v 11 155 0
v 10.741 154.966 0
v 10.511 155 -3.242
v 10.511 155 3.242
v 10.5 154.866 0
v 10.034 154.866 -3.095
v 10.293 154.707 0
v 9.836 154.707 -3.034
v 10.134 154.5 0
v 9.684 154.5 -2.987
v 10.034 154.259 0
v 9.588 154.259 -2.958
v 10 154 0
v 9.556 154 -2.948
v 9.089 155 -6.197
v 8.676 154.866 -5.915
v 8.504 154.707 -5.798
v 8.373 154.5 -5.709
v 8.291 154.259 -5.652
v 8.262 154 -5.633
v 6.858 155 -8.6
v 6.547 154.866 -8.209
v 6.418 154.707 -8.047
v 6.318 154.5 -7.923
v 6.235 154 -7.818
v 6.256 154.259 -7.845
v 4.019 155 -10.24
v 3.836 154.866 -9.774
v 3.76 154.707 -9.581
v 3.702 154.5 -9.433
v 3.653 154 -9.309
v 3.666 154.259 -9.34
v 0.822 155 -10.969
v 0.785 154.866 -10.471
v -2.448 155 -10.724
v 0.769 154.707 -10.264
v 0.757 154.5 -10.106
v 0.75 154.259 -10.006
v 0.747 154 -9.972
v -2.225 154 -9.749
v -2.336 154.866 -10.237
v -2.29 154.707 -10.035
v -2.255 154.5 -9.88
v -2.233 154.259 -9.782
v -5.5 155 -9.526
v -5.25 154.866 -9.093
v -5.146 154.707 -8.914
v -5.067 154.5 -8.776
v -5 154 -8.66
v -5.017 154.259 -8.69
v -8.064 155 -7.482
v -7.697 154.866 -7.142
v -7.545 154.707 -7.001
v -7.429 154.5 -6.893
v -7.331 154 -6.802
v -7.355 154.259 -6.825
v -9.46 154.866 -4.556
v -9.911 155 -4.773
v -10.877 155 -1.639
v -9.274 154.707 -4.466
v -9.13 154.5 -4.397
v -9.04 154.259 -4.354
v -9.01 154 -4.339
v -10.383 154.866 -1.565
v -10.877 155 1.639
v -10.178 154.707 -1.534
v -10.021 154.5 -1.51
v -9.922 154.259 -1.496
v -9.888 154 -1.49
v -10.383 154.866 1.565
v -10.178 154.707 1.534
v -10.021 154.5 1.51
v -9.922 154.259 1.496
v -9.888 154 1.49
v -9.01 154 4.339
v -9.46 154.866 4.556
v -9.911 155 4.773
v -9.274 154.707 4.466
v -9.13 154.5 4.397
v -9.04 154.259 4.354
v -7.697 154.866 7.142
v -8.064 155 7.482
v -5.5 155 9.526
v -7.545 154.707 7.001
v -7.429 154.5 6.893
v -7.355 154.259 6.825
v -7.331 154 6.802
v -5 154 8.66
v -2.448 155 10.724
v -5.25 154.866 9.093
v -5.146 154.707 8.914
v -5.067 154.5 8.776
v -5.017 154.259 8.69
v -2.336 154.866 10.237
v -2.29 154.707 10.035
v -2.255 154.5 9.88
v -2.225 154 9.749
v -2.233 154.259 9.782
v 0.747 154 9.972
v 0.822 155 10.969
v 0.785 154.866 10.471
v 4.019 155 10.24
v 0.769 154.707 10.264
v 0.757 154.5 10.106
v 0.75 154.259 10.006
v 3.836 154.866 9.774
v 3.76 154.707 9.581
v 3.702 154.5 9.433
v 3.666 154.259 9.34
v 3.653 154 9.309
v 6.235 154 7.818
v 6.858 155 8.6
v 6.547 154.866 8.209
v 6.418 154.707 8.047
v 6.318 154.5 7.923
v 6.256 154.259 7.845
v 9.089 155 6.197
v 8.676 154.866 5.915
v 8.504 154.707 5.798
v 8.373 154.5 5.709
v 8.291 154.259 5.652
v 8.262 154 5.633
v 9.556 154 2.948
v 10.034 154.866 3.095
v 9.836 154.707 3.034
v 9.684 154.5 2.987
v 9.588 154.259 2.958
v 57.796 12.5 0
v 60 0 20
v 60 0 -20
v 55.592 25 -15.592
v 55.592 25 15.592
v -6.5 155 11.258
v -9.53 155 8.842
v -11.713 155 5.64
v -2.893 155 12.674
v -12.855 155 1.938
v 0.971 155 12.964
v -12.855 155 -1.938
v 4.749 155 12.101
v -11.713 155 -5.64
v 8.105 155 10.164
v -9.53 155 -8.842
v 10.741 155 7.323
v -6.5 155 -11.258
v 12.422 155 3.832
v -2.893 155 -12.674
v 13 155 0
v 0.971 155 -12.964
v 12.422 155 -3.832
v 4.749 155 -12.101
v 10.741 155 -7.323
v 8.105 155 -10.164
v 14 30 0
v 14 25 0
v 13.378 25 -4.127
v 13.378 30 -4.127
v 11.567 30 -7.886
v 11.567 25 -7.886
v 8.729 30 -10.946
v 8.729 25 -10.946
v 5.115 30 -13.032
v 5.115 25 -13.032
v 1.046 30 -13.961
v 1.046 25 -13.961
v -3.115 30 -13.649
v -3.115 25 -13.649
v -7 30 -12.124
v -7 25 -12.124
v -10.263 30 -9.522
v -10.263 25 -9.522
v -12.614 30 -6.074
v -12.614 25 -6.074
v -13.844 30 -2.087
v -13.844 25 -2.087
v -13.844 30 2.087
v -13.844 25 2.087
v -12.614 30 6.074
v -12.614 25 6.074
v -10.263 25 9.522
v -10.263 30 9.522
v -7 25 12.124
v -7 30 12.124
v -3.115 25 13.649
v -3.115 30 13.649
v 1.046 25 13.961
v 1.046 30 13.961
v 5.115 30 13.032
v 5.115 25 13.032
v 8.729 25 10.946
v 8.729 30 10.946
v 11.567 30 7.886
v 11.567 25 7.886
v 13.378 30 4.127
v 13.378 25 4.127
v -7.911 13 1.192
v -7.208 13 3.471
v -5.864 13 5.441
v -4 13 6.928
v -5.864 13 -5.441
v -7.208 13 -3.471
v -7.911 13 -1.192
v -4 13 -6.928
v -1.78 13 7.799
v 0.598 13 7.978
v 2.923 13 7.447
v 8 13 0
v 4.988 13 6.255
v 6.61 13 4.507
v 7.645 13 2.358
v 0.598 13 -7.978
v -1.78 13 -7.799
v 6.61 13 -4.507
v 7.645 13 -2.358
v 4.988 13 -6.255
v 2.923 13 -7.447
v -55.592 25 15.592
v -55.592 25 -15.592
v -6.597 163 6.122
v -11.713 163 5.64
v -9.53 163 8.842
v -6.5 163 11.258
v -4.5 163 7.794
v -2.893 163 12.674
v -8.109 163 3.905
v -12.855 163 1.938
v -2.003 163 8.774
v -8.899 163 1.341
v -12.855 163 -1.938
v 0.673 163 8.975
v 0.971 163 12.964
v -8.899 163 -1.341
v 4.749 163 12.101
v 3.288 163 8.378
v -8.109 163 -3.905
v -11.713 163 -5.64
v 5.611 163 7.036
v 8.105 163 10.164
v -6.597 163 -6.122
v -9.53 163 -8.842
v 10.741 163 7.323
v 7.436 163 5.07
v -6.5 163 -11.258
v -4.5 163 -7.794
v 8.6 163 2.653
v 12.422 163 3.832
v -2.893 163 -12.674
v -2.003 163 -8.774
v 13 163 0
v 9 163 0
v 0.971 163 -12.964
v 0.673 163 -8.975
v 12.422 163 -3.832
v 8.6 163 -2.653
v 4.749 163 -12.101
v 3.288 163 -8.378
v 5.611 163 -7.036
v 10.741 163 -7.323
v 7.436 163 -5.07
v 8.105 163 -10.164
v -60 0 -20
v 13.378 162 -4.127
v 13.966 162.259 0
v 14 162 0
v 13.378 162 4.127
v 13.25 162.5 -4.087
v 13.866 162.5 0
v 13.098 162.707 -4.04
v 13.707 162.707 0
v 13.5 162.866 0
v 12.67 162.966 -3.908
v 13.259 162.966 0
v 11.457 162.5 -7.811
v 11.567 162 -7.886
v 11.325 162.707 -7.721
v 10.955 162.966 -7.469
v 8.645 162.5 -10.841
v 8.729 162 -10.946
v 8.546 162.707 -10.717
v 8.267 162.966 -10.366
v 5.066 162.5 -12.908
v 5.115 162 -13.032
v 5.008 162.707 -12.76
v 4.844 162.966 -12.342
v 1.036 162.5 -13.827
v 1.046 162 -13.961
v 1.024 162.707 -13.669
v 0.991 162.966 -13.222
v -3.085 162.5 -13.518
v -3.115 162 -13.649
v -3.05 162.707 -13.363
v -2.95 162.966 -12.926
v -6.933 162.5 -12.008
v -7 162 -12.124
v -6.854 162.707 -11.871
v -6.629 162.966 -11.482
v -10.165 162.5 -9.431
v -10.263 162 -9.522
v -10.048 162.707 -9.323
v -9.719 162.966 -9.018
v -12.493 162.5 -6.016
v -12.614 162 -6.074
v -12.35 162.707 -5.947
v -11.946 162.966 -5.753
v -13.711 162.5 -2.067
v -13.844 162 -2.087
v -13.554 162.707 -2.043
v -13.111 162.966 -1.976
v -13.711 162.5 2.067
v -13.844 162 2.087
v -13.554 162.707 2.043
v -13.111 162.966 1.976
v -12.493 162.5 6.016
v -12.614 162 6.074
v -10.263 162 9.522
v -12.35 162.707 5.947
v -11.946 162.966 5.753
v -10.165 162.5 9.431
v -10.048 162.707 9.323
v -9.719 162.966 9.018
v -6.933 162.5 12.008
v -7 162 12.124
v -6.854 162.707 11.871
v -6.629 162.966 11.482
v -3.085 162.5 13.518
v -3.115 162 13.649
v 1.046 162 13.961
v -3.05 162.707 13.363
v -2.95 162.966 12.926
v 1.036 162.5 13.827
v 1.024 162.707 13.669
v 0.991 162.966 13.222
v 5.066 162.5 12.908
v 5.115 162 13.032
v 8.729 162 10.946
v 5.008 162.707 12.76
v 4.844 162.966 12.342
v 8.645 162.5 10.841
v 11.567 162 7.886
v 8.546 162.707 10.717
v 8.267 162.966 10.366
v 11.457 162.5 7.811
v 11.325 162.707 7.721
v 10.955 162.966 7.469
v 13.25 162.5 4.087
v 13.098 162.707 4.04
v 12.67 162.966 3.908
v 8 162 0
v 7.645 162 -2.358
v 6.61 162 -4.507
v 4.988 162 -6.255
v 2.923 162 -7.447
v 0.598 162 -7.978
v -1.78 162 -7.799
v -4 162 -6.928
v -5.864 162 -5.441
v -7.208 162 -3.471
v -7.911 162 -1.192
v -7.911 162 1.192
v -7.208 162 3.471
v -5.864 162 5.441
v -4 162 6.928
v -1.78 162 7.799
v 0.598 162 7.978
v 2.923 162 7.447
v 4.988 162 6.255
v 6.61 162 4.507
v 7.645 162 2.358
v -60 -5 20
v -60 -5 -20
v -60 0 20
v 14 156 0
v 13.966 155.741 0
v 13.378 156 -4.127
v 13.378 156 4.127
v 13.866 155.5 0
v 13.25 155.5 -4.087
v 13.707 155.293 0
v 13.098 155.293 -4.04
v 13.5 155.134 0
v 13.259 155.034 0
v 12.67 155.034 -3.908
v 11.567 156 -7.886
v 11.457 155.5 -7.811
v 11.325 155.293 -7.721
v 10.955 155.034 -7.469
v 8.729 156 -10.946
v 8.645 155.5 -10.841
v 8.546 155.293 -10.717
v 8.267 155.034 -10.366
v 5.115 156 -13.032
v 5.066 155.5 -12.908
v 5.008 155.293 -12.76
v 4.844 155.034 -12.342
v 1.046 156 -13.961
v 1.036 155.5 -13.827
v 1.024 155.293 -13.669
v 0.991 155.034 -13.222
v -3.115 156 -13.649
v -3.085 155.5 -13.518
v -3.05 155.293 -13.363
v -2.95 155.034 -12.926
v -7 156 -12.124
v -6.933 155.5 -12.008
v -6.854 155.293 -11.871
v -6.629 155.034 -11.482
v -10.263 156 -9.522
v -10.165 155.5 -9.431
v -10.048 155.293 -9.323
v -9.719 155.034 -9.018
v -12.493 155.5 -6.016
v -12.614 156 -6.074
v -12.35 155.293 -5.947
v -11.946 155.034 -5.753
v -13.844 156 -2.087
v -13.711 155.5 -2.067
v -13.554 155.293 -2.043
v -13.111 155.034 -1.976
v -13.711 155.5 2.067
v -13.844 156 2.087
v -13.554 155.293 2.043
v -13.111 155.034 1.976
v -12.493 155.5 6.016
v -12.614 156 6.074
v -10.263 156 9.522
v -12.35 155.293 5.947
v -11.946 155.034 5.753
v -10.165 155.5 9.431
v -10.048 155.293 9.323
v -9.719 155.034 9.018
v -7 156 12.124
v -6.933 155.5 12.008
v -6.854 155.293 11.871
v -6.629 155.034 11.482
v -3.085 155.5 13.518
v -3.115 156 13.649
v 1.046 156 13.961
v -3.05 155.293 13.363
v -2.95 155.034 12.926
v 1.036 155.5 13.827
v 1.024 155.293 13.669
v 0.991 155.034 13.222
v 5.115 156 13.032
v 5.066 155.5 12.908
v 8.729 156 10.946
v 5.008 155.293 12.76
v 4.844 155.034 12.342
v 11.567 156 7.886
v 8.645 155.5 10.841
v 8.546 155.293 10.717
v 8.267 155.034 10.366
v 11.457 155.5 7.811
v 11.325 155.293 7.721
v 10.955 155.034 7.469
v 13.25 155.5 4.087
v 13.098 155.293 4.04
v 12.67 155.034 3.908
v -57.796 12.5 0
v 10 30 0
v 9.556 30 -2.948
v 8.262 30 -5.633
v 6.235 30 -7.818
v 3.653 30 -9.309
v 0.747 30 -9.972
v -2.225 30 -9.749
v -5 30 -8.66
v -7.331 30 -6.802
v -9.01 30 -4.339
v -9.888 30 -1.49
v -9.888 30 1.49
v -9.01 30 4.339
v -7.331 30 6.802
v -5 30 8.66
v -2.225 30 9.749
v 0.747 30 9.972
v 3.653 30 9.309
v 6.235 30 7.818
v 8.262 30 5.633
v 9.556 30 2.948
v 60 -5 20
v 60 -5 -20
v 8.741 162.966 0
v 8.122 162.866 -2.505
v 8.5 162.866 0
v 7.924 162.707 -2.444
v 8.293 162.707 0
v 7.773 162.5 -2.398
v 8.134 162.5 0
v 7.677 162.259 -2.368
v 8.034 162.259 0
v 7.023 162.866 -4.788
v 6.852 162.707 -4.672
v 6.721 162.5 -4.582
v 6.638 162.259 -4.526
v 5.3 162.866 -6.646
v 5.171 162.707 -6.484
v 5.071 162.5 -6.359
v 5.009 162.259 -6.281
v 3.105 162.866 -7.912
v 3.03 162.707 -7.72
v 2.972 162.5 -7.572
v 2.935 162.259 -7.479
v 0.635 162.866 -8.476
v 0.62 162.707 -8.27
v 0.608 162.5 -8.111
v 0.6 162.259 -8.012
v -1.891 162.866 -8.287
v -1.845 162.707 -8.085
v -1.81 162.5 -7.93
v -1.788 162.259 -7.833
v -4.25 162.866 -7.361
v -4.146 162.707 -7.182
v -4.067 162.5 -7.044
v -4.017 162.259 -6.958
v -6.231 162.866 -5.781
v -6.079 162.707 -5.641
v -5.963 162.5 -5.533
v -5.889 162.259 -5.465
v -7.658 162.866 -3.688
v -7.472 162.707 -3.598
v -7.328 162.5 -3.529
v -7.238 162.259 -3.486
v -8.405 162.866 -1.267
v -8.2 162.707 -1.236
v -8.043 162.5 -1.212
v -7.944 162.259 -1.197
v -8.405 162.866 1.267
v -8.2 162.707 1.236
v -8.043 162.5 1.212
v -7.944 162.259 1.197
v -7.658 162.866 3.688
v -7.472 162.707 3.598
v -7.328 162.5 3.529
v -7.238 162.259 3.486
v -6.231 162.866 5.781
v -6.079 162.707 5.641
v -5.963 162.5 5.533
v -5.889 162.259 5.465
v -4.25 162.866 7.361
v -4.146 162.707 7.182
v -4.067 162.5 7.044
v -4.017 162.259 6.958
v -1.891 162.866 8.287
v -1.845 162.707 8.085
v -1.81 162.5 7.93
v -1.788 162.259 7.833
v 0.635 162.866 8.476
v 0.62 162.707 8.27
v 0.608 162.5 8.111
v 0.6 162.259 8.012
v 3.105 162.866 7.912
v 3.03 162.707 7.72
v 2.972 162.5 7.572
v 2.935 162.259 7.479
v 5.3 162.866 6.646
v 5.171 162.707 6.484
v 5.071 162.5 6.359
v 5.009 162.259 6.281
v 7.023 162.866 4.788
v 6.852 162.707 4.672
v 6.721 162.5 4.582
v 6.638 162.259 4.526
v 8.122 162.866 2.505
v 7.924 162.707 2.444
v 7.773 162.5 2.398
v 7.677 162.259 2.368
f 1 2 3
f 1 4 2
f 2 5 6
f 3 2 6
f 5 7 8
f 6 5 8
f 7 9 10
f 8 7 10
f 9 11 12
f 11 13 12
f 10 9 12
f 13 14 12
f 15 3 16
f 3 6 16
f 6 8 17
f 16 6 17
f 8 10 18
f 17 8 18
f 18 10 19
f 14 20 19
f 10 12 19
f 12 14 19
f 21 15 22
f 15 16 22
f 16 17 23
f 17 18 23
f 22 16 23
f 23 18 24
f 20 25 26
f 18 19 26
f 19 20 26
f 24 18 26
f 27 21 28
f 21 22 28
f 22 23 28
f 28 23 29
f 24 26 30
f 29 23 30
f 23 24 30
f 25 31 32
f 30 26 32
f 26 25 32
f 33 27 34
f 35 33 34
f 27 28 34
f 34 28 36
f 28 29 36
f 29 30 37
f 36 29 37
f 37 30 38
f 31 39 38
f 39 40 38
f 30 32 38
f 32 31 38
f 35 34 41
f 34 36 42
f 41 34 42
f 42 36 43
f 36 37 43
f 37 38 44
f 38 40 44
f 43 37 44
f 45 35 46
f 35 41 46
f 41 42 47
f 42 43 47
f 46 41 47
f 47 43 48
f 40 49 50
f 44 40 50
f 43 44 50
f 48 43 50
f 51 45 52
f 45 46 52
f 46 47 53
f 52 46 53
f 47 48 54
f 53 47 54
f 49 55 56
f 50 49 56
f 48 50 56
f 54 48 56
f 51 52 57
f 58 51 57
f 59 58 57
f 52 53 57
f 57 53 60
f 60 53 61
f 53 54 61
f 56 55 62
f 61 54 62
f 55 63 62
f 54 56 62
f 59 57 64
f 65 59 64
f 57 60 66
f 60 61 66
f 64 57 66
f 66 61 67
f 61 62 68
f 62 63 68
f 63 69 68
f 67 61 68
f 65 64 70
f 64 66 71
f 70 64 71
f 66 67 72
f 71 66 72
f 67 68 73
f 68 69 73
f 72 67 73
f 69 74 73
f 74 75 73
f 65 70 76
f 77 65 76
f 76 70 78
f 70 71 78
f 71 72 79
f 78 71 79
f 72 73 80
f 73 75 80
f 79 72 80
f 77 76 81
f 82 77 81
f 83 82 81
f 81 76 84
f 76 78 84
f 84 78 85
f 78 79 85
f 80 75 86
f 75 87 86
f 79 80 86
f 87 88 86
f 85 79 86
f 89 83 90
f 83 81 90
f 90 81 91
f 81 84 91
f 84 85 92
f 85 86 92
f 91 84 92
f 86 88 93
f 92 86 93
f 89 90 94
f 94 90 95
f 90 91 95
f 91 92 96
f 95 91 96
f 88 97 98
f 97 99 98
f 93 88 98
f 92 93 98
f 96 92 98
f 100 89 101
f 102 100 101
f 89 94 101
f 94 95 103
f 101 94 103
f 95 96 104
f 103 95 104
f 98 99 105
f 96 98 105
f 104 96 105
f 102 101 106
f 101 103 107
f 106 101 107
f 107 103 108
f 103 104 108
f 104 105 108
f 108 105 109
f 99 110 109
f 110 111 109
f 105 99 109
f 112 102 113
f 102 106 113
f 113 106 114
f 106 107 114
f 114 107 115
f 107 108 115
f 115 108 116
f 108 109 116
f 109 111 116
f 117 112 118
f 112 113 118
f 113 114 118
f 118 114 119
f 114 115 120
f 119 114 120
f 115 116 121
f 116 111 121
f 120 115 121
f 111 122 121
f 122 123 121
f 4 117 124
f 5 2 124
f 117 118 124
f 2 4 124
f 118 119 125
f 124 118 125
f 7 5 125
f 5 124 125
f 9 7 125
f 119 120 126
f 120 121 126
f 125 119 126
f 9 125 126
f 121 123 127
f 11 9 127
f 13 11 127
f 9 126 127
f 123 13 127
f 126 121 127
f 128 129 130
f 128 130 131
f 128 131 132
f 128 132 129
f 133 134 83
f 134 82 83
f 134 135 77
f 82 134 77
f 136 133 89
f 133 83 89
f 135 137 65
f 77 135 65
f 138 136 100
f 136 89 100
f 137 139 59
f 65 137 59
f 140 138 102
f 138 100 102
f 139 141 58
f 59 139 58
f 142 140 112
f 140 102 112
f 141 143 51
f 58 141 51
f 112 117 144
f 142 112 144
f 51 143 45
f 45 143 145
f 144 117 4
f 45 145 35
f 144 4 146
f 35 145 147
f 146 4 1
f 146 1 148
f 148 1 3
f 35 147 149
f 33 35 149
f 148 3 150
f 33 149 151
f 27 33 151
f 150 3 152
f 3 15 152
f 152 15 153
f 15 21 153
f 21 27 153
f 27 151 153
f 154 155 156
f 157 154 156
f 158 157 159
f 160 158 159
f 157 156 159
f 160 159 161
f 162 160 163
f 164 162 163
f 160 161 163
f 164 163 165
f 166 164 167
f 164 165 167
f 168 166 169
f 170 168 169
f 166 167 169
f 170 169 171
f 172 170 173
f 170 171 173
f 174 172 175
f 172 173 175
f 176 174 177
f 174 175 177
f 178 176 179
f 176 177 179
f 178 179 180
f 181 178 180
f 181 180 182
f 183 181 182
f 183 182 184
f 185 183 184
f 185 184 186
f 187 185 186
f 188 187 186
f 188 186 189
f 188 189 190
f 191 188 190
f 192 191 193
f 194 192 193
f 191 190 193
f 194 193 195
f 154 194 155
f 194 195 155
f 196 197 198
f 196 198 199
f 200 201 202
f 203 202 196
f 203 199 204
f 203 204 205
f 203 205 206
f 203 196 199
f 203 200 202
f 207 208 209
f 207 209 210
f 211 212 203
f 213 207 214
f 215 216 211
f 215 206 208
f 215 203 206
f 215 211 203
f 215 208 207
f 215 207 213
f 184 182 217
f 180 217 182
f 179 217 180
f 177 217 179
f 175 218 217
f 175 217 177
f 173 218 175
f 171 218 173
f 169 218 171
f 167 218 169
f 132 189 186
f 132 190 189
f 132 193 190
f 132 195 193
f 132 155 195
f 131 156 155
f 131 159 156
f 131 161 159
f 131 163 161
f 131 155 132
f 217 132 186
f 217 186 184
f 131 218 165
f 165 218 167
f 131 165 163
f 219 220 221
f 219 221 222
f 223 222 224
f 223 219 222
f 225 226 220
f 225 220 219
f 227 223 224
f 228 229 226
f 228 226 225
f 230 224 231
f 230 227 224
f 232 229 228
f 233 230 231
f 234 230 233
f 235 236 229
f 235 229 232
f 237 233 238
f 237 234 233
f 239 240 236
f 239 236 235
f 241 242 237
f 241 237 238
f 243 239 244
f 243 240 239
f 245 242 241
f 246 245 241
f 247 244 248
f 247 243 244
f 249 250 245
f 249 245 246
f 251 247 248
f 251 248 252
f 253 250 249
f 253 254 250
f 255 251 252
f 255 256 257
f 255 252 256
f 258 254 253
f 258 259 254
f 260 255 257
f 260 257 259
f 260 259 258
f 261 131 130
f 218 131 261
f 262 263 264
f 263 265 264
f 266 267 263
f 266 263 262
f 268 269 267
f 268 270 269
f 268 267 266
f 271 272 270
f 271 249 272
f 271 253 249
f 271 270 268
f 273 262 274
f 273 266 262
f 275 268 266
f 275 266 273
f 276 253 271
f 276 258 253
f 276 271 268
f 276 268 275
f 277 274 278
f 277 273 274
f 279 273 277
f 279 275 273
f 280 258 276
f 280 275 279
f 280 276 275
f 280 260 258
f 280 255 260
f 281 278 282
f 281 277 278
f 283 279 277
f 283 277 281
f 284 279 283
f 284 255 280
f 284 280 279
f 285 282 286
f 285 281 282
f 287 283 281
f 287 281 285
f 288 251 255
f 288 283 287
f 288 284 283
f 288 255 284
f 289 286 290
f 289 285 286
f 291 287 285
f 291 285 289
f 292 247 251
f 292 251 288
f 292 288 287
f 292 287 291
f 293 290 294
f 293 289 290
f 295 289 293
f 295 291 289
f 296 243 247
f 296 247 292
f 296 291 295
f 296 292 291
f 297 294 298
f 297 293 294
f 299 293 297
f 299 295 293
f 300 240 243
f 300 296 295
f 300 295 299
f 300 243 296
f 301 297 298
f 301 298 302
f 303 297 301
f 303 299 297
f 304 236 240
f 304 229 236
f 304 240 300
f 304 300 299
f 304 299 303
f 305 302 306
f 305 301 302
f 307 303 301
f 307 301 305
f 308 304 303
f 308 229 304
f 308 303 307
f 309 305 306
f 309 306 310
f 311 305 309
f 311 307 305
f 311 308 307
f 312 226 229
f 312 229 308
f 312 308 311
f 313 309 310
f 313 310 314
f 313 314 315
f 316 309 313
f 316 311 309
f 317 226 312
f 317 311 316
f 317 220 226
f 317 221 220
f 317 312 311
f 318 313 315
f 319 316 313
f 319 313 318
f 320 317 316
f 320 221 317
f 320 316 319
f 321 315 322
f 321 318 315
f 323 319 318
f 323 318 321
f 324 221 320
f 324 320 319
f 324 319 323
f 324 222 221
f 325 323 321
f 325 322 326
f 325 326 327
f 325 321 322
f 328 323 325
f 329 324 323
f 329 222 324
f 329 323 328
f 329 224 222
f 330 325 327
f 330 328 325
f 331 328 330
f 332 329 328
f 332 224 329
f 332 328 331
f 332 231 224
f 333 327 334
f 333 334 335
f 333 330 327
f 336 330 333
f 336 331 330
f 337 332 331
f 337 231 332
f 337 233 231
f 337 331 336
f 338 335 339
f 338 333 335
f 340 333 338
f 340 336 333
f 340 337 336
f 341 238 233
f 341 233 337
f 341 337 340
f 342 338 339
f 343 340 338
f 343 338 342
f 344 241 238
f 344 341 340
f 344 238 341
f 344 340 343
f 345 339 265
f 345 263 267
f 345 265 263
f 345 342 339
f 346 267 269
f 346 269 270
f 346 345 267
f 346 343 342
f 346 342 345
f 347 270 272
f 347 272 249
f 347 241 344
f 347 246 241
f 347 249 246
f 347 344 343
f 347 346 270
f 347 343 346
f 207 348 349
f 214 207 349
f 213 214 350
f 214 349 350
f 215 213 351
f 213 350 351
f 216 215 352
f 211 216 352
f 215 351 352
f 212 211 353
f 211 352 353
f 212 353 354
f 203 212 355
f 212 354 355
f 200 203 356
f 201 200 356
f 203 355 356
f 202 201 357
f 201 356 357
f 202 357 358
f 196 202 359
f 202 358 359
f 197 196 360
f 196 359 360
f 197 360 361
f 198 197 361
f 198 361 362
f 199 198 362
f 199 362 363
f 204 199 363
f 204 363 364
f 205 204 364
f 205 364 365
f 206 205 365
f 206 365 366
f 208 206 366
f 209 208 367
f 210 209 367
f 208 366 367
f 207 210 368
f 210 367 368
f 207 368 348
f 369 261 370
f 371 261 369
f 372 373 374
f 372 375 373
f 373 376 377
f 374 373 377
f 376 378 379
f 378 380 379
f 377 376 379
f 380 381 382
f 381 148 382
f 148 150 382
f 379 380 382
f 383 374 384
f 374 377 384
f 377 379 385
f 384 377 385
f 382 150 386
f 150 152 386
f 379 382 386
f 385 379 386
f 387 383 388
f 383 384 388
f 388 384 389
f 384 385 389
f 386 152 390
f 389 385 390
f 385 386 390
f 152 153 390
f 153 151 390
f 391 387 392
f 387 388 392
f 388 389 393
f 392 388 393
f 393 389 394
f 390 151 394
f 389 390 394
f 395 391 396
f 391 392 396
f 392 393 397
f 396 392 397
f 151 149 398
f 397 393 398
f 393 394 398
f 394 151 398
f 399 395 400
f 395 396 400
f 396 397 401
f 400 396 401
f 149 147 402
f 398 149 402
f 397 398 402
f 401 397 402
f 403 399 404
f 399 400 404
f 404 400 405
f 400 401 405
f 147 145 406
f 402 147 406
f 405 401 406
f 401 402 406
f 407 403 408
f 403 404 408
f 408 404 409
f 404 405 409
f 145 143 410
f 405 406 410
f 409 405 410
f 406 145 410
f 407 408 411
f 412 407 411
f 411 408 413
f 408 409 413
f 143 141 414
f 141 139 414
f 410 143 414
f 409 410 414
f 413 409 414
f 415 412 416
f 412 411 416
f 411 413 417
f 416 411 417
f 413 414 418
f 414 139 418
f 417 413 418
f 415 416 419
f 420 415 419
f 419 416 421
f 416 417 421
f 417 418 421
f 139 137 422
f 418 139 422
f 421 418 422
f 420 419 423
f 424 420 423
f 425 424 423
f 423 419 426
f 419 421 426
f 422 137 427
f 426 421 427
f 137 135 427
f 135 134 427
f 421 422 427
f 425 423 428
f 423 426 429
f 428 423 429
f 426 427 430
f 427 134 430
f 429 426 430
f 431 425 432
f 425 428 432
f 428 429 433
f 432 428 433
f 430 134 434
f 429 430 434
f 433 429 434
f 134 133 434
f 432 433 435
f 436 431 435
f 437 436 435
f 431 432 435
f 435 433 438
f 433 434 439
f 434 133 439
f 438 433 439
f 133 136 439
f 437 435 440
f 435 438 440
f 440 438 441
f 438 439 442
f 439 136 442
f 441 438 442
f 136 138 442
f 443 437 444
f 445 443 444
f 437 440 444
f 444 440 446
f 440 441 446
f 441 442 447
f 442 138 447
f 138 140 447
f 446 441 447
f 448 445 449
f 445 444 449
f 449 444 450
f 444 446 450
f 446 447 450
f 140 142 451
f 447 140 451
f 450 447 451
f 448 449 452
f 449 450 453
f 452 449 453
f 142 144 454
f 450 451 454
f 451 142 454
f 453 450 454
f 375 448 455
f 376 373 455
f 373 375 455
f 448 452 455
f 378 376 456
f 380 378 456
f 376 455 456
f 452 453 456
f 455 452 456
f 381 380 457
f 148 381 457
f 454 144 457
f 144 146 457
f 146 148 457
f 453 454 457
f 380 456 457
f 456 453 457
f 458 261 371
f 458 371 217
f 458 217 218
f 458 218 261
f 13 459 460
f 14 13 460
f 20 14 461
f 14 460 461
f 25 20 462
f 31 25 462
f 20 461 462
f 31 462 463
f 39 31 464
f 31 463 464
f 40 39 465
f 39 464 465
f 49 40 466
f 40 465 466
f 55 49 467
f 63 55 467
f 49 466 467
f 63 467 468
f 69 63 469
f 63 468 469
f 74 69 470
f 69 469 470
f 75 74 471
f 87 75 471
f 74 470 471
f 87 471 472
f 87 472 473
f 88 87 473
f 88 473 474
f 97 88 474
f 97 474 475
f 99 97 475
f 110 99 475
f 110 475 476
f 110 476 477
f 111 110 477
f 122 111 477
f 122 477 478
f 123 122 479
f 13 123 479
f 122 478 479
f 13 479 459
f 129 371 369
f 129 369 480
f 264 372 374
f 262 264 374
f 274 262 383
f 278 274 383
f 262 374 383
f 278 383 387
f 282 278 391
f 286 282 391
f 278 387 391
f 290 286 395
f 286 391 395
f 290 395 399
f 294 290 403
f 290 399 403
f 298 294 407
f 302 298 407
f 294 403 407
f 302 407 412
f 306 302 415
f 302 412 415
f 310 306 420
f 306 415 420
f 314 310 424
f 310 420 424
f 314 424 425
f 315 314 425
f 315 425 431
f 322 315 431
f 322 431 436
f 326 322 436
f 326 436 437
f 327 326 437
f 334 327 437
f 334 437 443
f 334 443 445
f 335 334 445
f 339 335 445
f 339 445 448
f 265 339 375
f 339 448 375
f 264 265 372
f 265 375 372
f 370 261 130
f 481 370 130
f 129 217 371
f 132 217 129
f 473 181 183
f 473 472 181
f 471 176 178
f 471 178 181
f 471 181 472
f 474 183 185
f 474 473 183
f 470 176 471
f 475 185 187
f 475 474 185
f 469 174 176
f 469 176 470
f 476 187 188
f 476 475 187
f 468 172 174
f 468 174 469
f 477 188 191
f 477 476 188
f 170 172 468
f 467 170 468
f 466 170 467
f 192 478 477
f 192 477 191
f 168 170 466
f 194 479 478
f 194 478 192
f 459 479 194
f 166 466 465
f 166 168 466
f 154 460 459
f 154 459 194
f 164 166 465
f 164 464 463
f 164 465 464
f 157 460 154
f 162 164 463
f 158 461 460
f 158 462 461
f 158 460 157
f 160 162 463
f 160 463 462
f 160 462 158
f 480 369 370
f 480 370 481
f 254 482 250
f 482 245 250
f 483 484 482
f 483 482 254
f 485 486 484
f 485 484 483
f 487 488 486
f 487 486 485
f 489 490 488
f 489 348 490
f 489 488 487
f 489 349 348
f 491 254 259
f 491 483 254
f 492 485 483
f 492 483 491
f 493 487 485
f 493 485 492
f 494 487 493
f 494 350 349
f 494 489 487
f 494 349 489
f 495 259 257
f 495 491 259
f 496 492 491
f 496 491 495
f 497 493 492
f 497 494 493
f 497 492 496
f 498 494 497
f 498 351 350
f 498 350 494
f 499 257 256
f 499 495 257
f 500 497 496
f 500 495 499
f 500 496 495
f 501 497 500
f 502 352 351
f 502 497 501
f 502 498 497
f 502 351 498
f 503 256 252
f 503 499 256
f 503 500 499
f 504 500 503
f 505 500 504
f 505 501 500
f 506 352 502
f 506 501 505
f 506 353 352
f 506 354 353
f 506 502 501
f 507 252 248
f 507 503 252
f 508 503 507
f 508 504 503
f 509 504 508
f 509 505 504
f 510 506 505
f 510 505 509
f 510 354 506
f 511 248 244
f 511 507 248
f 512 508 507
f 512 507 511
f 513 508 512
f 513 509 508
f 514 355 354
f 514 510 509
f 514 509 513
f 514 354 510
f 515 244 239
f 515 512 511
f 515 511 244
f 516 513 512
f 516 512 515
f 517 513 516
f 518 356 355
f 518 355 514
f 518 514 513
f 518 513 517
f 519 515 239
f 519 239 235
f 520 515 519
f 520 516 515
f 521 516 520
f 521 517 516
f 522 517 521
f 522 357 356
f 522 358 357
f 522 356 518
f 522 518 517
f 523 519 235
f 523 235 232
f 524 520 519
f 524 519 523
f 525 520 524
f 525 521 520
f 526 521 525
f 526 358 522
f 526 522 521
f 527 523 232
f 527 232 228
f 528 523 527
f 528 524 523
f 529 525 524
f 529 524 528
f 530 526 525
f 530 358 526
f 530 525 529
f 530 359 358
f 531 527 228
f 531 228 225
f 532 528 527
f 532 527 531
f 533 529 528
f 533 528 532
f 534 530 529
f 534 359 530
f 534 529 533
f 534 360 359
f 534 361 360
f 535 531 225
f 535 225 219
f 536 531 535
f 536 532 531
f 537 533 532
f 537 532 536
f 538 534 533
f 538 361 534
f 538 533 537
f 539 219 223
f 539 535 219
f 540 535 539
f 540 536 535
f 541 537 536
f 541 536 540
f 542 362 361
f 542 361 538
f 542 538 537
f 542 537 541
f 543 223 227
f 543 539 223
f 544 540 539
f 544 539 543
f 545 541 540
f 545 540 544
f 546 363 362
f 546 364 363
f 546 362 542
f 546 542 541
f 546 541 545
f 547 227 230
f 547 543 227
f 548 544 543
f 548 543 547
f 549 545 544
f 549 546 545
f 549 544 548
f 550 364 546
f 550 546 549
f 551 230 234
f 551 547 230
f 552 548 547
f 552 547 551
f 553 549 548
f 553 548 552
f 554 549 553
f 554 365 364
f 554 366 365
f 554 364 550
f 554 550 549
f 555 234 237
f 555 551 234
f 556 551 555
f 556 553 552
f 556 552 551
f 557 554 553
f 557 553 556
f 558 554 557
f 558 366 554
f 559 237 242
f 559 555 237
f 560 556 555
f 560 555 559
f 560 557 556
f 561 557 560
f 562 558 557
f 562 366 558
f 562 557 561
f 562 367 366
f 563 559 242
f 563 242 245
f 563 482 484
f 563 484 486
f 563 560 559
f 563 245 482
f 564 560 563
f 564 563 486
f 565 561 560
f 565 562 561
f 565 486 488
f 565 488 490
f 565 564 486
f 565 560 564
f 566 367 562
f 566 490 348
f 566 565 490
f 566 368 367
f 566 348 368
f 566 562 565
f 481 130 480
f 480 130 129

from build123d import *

# Parameters (mm, degrees)
SKETCH1_W           = 120
SKETCH1_H           = 40
BOSS_EXTRUDE1_DEPTH = 25
BOSS_EXTRUDE1_TAPER = 10
SKETCH2_R           = 14
BOSS_EXTRUDE2_DEPTH = 5
SKETCH3_R           = 10
BOSS_EXTRUDE3_DEPTH = 125
SKETCH4_R           = 14
BOSS_EXTRUDE4_DEPTH = 8
SKETCH5_R           = 8
CUT_EXTRUDE1_DEPTH  = 150
FILLET1_R           = 1
SKETCH6_W           = 120
SKETCH6_H           = 40
BOSS_EXTRUDE5_DEPTH = 5


with BuildPart() as part:
    # Sketch1 → Boss-Extrude1 (new body)
    with BuildSketch(Plane(origin=(0, 0, 0), x_dir=(1, 0, 0), z_dir=(0, 1, 0))):
        Rectangle(SKETCH1_W, SKETCH1_H)
    extrude(amount=BOSS_EXTRUDE1_DEPTH, taper=BOSS_EXTRUDE1_TAPER)

    # Sketch2 → Boss-Extrude2 (add)
    with BuildSketch(Plane(origin=(0, 25, 0), x_dir=(1, 0, 0), z_dir=(0, 1, 0))):
        Circle(SKETCH2_R)
    extrude(amount=BOSS_EXTRUDE2_DEPTH)

    # Sketch3 → Boss-Extrude3 (add)
    with BuildSketch(Plane(origin=(0, 30, 0), x_dir=(1, 0, 0), z_dir=(0, 1, 0))):
        Circle(SKETCH3_R)
    extrude(amount=BOSS_EXTRUDE3_DEPTH)

    # Sketch4 → Boss-Extrude4 (add)
    with BuildSketch(Plane(origin=(0, 155, 0), x_dir=(1, 0, 0), z_dir=(0, 1, 0))):
        Circle(SKETCH4_R)
    extrude(amount=BOSS_EXTRUDE4_DEPTH)

    # Sketch5 → Cut-Extrude1 (cut)
    with BuildSketch(Plane(origin=(0, 163, 0), x_dir=(1, 0, 0), z_dir=(0, 1, 0))):
        Circle(SKETCH5_R)
    extrude(amount=-CUT_EXTRUDE1_DEPTH, mode=Mode.SUBTRACT)

    # Fillet1
    fillet1_edges = [part.edges().sort_by_distance(p)[0] for p in [
        (-10, 155, 0),
        (-14, 155, 0),
        (-14, 163, 0),
        (-8, 163, 0),
    ]]
    fillet(fillet1_edges, radius=FILLET1_R)

    # Sketch6 → Boss-Extrude5 (add)
    with BuildSketch(Plane.XZ):
        Rectangle(SKETCH6_W, SKETCH6_H)
    extrude(amount=BOSS_EXTRUDE5_DEPTH)


solid = part.part
